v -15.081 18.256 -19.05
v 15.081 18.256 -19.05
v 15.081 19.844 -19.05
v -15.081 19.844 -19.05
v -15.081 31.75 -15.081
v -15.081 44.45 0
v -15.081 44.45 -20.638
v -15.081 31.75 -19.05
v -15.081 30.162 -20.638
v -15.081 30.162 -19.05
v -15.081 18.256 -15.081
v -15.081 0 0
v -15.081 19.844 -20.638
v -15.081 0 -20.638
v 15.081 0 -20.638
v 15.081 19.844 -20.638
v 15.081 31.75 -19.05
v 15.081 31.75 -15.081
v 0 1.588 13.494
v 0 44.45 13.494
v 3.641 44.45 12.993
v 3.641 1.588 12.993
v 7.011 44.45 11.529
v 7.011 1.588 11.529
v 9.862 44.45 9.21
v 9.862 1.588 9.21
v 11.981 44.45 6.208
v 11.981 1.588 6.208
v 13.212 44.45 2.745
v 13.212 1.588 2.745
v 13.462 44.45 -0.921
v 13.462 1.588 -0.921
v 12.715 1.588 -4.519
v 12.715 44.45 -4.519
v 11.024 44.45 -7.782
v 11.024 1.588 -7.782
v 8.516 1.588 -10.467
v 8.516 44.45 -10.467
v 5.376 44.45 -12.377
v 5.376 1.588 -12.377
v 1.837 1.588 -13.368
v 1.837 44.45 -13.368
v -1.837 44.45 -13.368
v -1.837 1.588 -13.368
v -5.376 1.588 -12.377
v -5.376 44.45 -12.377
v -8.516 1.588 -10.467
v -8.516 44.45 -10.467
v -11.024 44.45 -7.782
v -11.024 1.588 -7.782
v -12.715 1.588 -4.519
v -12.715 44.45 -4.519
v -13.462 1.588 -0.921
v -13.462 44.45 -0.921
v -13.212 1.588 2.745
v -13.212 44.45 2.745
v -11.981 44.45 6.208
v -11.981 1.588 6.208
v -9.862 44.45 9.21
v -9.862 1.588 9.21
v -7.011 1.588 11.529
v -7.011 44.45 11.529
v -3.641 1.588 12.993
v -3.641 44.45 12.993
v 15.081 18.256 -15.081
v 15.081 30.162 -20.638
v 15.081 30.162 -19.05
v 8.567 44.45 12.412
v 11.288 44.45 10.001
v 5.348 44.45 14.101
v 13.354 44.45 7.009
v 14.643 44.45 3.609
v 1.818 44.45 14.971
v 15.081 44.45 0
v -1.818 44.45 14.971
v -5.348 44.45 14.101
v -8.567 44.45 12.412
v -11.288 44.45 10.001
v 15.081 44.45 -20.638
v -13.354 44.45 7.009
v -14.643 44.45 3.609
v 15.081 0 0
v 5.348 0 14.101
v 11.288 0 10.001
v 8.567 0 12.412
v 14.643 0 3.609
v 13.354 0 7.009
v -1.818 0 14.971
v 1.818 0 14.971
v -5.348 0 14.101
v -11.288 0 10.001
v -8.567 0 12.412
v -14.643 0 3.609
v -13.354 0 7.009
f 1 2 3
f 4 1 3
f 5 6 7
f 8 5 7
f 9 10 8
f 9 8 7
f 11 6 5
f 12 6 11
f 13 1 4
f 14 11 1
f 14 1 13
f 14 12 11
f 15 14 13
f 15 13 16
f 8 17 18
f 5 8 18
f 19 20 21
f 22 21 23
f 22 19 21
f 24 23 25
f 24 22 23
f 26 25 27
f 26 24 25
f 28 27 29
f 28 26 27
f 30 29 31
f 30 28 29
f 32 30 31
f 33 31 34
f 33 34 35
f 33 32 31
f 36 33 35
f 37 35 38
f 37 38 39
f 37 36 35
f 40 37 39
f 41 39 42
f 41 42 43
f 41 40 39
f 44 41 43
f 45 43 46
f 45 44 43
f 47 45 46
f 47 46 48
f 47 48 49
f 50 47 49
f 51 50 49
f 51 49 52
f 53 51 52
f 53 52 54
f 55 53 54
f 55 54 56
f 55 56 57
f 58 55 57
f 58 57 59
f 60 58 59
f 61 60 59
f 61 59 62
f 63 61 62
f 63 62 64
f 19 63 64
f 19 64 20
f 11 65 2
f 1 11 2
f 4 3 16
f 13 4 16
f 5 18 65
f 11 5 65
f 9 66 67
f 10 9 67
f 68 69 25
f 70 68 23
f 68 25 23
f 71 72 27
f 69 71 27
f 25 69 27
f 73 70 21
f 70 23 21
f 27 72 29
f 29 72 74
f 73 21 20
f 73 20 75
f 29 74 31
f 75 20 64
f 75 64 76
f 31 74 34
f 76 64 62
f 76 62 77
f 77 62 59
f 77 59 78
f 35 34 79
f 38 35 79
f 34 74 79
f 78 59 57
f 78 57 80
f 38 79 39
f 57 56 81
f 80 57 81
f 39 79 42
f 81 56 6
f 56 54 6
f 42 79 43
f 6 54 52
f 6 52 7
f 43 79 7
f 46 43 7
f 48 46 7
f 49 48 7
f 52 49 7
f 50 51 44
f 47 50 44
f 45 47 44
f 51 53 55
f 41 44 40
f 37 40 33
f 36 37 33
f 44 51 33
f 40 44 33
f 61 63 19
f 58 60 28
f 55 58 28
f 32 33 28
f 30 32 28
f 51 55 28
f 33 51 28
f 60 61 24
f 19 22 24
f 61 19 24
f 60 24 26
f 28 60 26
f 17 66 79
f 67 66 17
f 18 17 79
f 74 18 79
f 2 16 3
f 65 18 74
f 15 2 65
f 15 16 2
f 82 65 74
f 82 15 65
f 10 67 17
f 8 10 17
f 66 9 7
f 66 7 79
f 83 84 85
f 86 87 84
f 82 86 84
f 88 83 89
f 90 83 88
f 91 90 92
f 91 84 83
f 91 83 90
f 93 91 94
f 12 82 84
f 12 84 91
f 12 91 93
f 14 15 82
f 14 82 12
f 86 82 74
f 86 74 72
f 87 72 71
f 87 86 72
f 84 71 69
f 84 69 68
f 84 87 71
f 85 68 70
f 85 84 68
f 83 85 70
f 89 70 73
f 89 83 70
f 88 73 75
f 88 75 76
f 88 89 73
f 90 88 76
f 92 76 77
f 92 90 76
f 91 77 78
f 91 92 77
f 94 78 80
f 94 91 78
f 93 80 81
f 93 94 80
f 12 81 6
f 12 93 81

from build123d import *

# Parameters (mm, degrees)
SKETCH1_R           = 13.49375
BOSS_EXTRUDE1_DEPTH = 44.45
SKETCH2_R           = 15.08125
BOSS_EXTRUDE2_DEPTH = 1.5875
CUT_EXTRUDE1_DEPTH  = 58.545506449


with BuildPart() as part:
    # Sketch1 → Boss-Extrude1 (new body)
    with BuildSketch(Plane(origin=(0, 0, 0), x_dir=(1, 0, 0), z_dir=(0, 1, 0))):
        with BuildLine():
            Line((-15.08125, 0), (-15.08125, 20.6375))
            Line((-15.08125, 20.6375), (15.08125, 20.6375))
            Line((15.08125, 20.6375), (15.08125, 0))
            ThreePointArc((15.08125, 0), (0, -15.08125), (-15.08125, 0))
        make_face()
        with Locations(Location((0, 0, 0), (0, 0, 270))):
            Circle(SKETCH1_R, mode=Mode.SUBTRACT)
    extrude(amount=BOSS_EXTRUDE1_DEPTH)

    # Sketch2 → Boss-Extrude2 (add)
    with BuildSketch(Plane.XZ):
        Circle(SKETCH2_R)
    extrude(amount=-BOSS_EXTRUDE2_DEPTH)

    # Sketch3 → Cut-Extrude1 (cut, through all)
    with BuildSketch(Plane(origin=(15.08125, 0, 0), x_dir=(0, 0, -1), z_dir=(1, 0, 0))):
        Polygon((20.6375, 30.1625), (19.05, 30.1625), (19.05, 31.75), (15.08125, 31.75), (15.08125, 18.25625), (19.05, 18.25625), (19.05, 19.84375), (20.6375, 19.84375), align=None)
    extrude(amount=-CUT_EXTRUDE1_DEPTH, mode=Mode.SUBTRACT)


solid = part.part
